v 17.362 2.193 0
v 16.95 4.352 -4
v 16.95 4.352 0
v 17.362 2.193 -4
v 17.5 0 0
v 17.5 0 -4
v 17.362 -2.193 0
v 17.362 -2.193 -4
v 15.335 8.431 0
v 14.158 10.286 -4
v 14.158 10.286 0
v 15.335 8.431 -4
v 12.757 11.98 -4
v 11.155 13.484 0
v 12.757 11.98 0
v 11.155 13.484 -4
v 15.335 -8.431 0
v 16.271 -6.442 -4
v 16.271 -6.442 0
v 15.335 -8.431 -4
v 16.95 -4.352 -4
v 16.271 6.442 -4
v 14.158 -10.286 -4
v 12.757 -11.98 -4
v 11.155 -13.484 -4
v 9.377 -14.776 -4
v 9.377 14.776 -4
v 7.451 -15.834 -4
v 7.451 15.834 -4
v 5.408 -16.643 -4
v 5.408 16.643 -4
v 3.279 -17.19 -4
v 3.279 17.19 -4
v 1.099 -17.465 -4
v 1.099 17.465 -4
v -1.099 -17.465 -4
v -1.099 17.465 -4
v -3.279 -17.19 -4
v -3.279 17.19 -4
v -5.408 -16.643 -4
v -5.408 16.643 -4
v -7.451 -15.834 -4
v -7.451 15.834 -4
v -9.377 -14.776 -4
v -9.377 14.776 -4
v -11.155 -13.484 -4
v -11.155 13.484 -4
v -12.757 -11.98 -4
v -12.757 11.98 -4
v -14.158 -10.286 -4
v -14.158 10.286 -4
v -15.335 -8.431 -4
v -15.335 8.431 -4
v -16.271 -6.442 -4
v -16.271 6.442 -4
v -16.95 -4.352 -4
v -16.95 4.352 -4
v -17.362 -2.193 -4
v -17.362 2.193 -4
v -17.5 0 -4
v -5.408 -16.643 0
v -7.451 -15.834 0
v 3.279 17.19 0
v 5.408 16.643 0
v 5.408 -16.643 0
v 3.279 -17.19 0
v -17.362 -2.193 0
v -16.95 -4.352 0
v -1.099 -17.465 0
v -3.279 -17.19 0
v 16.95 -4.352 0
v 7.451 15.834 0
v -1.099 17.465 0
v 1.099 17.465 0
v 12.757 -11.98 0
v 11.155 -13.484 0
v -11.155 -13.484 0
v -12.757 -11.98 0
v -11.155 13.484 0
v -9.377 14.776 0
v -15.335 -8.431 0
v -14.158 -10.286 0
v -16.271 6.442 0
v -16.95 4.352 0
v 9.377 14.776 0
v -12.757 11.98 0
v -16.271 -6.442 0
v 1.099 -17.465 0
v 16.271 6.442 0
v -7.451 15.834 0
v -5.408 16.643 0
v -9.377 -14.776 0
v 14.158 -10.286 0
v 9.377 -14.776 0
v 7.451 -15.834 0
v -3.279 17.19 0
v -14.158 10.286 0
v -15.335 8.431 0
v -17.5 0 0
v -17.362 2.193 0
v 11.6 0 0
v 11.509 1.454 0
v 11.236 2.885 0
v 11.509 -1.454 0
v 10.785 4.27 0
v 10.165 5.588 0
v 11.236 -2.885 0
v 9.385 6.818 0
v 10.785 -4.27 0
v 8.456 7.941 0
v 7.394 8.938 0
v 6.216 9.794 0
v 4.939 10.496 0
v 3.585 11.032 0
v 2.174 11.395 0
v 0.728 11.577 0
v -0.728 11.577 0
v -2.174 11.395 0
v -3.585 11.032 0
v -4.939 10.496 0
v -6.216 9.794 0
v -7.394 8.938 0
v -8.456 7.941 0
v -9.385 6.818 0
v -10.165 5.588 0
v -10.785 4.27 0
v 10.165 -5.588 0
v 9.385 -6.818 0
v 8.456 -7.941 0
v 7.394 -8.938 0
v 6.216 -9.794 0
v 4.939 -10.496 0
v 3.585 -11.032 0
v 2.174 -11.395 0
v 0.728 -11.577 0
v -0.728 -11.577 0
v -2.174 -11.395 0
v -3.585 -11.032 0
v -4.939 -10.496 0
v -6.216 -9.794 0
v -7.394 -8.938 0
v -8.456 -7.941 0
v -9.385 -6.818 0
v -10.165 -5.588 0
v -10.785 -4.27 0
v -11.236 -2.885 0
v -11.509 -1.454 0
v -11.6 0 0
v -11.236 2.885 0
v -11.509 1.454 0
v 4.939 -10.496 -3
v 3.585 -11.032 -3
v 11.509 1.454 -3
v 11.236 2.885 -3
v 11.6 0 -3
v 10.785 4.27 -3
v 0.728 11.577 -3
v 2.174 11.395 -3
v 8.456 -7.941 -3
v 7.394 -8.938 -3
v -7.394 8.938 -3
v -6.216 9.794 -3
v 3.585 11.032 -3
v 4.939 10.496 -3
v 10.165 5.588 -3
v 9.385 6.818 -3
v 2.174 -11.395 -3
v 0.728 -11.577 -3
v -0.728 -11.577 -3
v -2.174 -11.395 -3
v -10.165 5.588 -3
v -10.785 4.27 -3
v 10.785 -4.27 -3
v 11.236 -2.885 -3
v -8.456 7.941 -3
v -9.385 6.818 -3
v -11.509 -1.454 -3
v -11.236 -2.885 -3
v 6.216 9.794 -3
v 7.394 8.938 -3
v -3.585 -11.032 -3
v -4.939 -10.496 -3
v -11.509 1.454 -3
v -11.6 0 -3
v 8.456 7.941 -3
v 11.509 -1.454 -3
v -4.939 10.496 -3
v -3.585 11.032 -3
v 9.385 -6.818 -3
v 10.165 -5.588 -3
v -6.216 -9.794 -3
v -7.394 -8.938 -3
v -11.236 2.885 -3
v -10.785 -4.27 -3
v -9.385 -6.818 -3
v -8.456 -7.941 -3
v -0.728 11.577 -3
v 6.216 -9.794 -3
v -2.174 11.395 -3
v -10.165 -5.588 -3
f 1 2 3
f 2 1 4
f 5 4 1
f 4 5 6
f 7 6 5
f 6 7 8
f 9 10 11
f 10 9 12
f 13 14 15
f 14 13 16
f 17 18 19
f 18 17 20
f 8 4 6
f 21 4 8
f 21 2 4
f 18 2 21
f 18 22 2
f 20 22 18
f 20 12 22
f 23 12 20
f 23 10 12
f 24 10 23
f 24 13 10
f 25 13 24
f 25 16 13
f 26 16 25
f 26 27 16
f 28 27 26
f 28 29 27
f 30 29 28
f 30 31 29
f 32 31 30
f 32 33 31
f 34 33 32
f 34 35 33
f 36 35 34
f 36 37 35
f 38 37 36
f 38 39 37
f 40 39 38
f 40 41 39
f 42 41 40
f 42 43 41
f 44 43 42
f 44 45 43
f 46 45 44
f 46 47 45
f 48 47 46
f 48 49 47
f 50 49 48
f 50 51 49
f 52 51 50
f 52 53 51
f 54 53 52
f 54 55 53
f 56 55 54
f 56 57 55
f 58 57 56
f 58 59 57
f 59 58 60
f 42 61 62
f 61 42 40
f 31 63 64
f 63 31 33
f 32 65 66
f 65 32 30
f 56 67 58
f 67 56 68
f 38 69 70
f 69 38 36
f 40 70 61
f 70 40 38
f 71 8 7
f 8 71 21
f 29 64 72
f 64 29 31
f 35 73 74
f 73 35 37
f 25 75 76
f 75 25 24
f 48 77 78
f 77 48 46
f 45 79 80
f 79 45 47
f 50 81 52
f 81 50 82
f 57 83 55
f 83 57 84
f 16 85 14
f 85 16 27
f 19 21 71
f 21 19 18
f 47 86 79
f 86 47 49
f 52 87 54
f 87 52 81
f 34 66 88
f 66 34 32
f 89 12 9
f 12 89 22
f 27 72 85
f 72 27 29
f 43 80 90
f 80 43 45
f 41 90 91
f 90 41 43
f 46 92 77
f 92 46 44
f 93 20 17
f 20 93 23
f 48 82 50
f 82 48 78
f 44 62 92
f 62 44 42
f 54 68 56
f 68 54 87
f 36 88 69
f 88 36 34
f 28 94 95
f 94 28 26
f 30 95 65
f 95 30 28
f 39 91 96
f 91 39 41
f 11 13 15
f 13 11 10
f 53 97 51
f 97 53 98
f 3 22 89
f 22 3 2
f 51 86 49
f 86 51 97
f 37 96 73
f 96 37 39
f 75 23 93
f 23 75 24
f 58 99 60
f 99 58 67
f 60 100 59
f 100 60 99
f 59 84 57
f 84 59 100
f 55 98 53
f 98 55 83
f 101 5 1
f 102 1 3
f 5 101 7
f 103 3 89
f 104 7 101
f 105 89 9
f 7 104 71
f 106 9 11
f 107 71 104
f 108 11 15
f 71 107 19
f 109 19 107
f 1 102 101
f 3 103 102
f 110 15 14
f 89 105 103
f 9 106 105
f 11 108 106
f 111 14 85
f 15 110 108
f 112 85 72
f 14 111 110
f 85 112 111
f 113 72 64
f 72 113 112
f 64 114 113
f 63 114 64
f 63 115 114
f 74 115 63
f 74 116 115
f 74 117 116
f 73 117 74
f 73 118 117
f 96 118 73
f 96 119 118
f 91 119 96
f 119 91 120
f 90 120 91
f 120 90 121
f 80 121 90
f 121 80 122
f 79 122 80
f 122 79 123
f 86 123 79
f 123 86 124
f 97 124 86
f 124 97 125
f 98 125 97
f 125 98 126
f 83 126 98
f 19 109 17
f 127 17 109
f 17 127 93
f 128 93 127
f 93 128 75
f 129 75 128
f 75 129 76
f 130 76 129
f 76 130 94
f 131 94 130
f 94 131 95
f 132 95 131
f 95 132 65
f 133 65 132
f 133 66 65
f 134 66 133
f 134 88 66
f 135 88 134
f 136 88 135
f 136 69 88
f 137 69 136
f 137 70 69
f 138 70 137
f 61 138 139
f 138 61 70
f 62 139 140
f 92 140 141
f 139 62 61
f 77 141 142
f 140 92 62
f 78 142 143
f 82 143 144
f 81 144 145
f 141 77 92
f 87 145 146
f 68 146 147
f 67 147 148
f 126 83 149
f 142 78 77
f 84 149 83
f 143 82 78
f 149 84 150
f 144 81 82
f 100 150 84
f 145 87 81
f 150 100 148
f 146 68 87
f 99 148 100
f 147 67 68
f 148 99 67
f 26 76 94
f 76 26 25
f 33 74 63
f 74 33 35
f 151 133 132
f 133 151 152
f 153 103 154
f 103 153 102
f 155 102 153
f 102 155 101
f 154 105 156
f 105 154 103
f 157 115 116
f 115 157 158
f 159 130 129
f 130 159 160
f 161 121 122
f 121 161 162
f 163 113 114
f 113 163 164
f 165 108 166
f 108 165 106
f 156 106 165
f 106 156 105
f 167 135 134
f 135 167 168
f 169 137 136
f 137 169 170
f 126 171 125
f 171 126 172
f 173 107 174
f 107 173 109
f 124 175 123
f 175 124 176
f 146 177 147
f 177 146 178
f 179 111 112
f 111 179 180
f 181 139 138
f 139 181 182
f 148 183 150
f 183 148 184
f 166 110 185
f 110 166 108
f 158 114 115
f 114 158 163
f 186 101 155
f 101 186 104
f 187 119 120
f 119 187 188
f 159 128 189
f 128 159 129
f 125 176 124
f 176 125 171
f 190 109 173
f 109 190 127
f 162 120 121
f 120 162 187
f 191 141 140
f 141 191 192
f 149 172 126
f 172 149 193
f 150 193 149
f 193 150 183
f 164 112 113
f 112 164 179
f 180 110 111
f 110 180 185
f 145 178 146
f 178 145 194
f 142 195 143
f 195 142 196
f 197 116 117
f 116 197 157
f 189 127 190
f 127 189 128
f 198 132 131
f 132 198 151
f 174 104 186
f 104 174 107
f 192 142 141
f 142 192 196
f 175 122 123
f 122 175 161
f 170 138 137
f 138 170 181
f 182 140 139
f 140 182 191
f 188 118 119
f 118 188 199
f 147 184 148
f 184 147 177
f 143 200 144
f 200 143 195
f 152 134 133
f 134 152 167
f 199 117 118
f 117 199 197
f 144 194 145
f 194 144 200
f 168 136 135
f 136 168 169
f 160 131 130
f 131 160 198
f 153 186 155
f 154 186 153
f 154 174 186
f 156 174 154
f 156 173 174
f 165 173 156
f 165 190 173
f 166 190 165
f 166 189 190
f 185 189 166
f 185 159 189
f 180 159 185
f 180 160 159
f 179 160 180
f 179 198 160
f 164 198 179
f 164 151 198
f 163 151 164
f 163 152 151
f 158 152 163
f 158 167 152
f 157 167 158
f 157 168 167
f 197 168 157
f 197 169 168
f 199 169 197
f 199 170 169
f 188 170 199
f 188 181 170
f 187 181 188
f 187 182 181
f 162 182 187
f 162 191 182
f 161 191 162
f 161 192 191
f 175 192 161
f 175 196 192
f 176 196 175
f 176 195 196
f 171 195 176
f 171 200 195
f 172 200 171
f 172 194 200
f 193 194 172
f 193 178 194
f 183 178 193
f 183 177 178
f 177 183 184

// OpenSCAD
$fn = 50;


difference() {
	union() {
		translate(v = [0, 0, -4.0000000000]) {
			cylinder(h = 4, r = 17.5000000000);
		}
	}
	union() {
		#translate(v = [0, 0, -3.0000000000]) {
			cylinder(h = 3, r = 11.6000000000);
		}
	}
}
